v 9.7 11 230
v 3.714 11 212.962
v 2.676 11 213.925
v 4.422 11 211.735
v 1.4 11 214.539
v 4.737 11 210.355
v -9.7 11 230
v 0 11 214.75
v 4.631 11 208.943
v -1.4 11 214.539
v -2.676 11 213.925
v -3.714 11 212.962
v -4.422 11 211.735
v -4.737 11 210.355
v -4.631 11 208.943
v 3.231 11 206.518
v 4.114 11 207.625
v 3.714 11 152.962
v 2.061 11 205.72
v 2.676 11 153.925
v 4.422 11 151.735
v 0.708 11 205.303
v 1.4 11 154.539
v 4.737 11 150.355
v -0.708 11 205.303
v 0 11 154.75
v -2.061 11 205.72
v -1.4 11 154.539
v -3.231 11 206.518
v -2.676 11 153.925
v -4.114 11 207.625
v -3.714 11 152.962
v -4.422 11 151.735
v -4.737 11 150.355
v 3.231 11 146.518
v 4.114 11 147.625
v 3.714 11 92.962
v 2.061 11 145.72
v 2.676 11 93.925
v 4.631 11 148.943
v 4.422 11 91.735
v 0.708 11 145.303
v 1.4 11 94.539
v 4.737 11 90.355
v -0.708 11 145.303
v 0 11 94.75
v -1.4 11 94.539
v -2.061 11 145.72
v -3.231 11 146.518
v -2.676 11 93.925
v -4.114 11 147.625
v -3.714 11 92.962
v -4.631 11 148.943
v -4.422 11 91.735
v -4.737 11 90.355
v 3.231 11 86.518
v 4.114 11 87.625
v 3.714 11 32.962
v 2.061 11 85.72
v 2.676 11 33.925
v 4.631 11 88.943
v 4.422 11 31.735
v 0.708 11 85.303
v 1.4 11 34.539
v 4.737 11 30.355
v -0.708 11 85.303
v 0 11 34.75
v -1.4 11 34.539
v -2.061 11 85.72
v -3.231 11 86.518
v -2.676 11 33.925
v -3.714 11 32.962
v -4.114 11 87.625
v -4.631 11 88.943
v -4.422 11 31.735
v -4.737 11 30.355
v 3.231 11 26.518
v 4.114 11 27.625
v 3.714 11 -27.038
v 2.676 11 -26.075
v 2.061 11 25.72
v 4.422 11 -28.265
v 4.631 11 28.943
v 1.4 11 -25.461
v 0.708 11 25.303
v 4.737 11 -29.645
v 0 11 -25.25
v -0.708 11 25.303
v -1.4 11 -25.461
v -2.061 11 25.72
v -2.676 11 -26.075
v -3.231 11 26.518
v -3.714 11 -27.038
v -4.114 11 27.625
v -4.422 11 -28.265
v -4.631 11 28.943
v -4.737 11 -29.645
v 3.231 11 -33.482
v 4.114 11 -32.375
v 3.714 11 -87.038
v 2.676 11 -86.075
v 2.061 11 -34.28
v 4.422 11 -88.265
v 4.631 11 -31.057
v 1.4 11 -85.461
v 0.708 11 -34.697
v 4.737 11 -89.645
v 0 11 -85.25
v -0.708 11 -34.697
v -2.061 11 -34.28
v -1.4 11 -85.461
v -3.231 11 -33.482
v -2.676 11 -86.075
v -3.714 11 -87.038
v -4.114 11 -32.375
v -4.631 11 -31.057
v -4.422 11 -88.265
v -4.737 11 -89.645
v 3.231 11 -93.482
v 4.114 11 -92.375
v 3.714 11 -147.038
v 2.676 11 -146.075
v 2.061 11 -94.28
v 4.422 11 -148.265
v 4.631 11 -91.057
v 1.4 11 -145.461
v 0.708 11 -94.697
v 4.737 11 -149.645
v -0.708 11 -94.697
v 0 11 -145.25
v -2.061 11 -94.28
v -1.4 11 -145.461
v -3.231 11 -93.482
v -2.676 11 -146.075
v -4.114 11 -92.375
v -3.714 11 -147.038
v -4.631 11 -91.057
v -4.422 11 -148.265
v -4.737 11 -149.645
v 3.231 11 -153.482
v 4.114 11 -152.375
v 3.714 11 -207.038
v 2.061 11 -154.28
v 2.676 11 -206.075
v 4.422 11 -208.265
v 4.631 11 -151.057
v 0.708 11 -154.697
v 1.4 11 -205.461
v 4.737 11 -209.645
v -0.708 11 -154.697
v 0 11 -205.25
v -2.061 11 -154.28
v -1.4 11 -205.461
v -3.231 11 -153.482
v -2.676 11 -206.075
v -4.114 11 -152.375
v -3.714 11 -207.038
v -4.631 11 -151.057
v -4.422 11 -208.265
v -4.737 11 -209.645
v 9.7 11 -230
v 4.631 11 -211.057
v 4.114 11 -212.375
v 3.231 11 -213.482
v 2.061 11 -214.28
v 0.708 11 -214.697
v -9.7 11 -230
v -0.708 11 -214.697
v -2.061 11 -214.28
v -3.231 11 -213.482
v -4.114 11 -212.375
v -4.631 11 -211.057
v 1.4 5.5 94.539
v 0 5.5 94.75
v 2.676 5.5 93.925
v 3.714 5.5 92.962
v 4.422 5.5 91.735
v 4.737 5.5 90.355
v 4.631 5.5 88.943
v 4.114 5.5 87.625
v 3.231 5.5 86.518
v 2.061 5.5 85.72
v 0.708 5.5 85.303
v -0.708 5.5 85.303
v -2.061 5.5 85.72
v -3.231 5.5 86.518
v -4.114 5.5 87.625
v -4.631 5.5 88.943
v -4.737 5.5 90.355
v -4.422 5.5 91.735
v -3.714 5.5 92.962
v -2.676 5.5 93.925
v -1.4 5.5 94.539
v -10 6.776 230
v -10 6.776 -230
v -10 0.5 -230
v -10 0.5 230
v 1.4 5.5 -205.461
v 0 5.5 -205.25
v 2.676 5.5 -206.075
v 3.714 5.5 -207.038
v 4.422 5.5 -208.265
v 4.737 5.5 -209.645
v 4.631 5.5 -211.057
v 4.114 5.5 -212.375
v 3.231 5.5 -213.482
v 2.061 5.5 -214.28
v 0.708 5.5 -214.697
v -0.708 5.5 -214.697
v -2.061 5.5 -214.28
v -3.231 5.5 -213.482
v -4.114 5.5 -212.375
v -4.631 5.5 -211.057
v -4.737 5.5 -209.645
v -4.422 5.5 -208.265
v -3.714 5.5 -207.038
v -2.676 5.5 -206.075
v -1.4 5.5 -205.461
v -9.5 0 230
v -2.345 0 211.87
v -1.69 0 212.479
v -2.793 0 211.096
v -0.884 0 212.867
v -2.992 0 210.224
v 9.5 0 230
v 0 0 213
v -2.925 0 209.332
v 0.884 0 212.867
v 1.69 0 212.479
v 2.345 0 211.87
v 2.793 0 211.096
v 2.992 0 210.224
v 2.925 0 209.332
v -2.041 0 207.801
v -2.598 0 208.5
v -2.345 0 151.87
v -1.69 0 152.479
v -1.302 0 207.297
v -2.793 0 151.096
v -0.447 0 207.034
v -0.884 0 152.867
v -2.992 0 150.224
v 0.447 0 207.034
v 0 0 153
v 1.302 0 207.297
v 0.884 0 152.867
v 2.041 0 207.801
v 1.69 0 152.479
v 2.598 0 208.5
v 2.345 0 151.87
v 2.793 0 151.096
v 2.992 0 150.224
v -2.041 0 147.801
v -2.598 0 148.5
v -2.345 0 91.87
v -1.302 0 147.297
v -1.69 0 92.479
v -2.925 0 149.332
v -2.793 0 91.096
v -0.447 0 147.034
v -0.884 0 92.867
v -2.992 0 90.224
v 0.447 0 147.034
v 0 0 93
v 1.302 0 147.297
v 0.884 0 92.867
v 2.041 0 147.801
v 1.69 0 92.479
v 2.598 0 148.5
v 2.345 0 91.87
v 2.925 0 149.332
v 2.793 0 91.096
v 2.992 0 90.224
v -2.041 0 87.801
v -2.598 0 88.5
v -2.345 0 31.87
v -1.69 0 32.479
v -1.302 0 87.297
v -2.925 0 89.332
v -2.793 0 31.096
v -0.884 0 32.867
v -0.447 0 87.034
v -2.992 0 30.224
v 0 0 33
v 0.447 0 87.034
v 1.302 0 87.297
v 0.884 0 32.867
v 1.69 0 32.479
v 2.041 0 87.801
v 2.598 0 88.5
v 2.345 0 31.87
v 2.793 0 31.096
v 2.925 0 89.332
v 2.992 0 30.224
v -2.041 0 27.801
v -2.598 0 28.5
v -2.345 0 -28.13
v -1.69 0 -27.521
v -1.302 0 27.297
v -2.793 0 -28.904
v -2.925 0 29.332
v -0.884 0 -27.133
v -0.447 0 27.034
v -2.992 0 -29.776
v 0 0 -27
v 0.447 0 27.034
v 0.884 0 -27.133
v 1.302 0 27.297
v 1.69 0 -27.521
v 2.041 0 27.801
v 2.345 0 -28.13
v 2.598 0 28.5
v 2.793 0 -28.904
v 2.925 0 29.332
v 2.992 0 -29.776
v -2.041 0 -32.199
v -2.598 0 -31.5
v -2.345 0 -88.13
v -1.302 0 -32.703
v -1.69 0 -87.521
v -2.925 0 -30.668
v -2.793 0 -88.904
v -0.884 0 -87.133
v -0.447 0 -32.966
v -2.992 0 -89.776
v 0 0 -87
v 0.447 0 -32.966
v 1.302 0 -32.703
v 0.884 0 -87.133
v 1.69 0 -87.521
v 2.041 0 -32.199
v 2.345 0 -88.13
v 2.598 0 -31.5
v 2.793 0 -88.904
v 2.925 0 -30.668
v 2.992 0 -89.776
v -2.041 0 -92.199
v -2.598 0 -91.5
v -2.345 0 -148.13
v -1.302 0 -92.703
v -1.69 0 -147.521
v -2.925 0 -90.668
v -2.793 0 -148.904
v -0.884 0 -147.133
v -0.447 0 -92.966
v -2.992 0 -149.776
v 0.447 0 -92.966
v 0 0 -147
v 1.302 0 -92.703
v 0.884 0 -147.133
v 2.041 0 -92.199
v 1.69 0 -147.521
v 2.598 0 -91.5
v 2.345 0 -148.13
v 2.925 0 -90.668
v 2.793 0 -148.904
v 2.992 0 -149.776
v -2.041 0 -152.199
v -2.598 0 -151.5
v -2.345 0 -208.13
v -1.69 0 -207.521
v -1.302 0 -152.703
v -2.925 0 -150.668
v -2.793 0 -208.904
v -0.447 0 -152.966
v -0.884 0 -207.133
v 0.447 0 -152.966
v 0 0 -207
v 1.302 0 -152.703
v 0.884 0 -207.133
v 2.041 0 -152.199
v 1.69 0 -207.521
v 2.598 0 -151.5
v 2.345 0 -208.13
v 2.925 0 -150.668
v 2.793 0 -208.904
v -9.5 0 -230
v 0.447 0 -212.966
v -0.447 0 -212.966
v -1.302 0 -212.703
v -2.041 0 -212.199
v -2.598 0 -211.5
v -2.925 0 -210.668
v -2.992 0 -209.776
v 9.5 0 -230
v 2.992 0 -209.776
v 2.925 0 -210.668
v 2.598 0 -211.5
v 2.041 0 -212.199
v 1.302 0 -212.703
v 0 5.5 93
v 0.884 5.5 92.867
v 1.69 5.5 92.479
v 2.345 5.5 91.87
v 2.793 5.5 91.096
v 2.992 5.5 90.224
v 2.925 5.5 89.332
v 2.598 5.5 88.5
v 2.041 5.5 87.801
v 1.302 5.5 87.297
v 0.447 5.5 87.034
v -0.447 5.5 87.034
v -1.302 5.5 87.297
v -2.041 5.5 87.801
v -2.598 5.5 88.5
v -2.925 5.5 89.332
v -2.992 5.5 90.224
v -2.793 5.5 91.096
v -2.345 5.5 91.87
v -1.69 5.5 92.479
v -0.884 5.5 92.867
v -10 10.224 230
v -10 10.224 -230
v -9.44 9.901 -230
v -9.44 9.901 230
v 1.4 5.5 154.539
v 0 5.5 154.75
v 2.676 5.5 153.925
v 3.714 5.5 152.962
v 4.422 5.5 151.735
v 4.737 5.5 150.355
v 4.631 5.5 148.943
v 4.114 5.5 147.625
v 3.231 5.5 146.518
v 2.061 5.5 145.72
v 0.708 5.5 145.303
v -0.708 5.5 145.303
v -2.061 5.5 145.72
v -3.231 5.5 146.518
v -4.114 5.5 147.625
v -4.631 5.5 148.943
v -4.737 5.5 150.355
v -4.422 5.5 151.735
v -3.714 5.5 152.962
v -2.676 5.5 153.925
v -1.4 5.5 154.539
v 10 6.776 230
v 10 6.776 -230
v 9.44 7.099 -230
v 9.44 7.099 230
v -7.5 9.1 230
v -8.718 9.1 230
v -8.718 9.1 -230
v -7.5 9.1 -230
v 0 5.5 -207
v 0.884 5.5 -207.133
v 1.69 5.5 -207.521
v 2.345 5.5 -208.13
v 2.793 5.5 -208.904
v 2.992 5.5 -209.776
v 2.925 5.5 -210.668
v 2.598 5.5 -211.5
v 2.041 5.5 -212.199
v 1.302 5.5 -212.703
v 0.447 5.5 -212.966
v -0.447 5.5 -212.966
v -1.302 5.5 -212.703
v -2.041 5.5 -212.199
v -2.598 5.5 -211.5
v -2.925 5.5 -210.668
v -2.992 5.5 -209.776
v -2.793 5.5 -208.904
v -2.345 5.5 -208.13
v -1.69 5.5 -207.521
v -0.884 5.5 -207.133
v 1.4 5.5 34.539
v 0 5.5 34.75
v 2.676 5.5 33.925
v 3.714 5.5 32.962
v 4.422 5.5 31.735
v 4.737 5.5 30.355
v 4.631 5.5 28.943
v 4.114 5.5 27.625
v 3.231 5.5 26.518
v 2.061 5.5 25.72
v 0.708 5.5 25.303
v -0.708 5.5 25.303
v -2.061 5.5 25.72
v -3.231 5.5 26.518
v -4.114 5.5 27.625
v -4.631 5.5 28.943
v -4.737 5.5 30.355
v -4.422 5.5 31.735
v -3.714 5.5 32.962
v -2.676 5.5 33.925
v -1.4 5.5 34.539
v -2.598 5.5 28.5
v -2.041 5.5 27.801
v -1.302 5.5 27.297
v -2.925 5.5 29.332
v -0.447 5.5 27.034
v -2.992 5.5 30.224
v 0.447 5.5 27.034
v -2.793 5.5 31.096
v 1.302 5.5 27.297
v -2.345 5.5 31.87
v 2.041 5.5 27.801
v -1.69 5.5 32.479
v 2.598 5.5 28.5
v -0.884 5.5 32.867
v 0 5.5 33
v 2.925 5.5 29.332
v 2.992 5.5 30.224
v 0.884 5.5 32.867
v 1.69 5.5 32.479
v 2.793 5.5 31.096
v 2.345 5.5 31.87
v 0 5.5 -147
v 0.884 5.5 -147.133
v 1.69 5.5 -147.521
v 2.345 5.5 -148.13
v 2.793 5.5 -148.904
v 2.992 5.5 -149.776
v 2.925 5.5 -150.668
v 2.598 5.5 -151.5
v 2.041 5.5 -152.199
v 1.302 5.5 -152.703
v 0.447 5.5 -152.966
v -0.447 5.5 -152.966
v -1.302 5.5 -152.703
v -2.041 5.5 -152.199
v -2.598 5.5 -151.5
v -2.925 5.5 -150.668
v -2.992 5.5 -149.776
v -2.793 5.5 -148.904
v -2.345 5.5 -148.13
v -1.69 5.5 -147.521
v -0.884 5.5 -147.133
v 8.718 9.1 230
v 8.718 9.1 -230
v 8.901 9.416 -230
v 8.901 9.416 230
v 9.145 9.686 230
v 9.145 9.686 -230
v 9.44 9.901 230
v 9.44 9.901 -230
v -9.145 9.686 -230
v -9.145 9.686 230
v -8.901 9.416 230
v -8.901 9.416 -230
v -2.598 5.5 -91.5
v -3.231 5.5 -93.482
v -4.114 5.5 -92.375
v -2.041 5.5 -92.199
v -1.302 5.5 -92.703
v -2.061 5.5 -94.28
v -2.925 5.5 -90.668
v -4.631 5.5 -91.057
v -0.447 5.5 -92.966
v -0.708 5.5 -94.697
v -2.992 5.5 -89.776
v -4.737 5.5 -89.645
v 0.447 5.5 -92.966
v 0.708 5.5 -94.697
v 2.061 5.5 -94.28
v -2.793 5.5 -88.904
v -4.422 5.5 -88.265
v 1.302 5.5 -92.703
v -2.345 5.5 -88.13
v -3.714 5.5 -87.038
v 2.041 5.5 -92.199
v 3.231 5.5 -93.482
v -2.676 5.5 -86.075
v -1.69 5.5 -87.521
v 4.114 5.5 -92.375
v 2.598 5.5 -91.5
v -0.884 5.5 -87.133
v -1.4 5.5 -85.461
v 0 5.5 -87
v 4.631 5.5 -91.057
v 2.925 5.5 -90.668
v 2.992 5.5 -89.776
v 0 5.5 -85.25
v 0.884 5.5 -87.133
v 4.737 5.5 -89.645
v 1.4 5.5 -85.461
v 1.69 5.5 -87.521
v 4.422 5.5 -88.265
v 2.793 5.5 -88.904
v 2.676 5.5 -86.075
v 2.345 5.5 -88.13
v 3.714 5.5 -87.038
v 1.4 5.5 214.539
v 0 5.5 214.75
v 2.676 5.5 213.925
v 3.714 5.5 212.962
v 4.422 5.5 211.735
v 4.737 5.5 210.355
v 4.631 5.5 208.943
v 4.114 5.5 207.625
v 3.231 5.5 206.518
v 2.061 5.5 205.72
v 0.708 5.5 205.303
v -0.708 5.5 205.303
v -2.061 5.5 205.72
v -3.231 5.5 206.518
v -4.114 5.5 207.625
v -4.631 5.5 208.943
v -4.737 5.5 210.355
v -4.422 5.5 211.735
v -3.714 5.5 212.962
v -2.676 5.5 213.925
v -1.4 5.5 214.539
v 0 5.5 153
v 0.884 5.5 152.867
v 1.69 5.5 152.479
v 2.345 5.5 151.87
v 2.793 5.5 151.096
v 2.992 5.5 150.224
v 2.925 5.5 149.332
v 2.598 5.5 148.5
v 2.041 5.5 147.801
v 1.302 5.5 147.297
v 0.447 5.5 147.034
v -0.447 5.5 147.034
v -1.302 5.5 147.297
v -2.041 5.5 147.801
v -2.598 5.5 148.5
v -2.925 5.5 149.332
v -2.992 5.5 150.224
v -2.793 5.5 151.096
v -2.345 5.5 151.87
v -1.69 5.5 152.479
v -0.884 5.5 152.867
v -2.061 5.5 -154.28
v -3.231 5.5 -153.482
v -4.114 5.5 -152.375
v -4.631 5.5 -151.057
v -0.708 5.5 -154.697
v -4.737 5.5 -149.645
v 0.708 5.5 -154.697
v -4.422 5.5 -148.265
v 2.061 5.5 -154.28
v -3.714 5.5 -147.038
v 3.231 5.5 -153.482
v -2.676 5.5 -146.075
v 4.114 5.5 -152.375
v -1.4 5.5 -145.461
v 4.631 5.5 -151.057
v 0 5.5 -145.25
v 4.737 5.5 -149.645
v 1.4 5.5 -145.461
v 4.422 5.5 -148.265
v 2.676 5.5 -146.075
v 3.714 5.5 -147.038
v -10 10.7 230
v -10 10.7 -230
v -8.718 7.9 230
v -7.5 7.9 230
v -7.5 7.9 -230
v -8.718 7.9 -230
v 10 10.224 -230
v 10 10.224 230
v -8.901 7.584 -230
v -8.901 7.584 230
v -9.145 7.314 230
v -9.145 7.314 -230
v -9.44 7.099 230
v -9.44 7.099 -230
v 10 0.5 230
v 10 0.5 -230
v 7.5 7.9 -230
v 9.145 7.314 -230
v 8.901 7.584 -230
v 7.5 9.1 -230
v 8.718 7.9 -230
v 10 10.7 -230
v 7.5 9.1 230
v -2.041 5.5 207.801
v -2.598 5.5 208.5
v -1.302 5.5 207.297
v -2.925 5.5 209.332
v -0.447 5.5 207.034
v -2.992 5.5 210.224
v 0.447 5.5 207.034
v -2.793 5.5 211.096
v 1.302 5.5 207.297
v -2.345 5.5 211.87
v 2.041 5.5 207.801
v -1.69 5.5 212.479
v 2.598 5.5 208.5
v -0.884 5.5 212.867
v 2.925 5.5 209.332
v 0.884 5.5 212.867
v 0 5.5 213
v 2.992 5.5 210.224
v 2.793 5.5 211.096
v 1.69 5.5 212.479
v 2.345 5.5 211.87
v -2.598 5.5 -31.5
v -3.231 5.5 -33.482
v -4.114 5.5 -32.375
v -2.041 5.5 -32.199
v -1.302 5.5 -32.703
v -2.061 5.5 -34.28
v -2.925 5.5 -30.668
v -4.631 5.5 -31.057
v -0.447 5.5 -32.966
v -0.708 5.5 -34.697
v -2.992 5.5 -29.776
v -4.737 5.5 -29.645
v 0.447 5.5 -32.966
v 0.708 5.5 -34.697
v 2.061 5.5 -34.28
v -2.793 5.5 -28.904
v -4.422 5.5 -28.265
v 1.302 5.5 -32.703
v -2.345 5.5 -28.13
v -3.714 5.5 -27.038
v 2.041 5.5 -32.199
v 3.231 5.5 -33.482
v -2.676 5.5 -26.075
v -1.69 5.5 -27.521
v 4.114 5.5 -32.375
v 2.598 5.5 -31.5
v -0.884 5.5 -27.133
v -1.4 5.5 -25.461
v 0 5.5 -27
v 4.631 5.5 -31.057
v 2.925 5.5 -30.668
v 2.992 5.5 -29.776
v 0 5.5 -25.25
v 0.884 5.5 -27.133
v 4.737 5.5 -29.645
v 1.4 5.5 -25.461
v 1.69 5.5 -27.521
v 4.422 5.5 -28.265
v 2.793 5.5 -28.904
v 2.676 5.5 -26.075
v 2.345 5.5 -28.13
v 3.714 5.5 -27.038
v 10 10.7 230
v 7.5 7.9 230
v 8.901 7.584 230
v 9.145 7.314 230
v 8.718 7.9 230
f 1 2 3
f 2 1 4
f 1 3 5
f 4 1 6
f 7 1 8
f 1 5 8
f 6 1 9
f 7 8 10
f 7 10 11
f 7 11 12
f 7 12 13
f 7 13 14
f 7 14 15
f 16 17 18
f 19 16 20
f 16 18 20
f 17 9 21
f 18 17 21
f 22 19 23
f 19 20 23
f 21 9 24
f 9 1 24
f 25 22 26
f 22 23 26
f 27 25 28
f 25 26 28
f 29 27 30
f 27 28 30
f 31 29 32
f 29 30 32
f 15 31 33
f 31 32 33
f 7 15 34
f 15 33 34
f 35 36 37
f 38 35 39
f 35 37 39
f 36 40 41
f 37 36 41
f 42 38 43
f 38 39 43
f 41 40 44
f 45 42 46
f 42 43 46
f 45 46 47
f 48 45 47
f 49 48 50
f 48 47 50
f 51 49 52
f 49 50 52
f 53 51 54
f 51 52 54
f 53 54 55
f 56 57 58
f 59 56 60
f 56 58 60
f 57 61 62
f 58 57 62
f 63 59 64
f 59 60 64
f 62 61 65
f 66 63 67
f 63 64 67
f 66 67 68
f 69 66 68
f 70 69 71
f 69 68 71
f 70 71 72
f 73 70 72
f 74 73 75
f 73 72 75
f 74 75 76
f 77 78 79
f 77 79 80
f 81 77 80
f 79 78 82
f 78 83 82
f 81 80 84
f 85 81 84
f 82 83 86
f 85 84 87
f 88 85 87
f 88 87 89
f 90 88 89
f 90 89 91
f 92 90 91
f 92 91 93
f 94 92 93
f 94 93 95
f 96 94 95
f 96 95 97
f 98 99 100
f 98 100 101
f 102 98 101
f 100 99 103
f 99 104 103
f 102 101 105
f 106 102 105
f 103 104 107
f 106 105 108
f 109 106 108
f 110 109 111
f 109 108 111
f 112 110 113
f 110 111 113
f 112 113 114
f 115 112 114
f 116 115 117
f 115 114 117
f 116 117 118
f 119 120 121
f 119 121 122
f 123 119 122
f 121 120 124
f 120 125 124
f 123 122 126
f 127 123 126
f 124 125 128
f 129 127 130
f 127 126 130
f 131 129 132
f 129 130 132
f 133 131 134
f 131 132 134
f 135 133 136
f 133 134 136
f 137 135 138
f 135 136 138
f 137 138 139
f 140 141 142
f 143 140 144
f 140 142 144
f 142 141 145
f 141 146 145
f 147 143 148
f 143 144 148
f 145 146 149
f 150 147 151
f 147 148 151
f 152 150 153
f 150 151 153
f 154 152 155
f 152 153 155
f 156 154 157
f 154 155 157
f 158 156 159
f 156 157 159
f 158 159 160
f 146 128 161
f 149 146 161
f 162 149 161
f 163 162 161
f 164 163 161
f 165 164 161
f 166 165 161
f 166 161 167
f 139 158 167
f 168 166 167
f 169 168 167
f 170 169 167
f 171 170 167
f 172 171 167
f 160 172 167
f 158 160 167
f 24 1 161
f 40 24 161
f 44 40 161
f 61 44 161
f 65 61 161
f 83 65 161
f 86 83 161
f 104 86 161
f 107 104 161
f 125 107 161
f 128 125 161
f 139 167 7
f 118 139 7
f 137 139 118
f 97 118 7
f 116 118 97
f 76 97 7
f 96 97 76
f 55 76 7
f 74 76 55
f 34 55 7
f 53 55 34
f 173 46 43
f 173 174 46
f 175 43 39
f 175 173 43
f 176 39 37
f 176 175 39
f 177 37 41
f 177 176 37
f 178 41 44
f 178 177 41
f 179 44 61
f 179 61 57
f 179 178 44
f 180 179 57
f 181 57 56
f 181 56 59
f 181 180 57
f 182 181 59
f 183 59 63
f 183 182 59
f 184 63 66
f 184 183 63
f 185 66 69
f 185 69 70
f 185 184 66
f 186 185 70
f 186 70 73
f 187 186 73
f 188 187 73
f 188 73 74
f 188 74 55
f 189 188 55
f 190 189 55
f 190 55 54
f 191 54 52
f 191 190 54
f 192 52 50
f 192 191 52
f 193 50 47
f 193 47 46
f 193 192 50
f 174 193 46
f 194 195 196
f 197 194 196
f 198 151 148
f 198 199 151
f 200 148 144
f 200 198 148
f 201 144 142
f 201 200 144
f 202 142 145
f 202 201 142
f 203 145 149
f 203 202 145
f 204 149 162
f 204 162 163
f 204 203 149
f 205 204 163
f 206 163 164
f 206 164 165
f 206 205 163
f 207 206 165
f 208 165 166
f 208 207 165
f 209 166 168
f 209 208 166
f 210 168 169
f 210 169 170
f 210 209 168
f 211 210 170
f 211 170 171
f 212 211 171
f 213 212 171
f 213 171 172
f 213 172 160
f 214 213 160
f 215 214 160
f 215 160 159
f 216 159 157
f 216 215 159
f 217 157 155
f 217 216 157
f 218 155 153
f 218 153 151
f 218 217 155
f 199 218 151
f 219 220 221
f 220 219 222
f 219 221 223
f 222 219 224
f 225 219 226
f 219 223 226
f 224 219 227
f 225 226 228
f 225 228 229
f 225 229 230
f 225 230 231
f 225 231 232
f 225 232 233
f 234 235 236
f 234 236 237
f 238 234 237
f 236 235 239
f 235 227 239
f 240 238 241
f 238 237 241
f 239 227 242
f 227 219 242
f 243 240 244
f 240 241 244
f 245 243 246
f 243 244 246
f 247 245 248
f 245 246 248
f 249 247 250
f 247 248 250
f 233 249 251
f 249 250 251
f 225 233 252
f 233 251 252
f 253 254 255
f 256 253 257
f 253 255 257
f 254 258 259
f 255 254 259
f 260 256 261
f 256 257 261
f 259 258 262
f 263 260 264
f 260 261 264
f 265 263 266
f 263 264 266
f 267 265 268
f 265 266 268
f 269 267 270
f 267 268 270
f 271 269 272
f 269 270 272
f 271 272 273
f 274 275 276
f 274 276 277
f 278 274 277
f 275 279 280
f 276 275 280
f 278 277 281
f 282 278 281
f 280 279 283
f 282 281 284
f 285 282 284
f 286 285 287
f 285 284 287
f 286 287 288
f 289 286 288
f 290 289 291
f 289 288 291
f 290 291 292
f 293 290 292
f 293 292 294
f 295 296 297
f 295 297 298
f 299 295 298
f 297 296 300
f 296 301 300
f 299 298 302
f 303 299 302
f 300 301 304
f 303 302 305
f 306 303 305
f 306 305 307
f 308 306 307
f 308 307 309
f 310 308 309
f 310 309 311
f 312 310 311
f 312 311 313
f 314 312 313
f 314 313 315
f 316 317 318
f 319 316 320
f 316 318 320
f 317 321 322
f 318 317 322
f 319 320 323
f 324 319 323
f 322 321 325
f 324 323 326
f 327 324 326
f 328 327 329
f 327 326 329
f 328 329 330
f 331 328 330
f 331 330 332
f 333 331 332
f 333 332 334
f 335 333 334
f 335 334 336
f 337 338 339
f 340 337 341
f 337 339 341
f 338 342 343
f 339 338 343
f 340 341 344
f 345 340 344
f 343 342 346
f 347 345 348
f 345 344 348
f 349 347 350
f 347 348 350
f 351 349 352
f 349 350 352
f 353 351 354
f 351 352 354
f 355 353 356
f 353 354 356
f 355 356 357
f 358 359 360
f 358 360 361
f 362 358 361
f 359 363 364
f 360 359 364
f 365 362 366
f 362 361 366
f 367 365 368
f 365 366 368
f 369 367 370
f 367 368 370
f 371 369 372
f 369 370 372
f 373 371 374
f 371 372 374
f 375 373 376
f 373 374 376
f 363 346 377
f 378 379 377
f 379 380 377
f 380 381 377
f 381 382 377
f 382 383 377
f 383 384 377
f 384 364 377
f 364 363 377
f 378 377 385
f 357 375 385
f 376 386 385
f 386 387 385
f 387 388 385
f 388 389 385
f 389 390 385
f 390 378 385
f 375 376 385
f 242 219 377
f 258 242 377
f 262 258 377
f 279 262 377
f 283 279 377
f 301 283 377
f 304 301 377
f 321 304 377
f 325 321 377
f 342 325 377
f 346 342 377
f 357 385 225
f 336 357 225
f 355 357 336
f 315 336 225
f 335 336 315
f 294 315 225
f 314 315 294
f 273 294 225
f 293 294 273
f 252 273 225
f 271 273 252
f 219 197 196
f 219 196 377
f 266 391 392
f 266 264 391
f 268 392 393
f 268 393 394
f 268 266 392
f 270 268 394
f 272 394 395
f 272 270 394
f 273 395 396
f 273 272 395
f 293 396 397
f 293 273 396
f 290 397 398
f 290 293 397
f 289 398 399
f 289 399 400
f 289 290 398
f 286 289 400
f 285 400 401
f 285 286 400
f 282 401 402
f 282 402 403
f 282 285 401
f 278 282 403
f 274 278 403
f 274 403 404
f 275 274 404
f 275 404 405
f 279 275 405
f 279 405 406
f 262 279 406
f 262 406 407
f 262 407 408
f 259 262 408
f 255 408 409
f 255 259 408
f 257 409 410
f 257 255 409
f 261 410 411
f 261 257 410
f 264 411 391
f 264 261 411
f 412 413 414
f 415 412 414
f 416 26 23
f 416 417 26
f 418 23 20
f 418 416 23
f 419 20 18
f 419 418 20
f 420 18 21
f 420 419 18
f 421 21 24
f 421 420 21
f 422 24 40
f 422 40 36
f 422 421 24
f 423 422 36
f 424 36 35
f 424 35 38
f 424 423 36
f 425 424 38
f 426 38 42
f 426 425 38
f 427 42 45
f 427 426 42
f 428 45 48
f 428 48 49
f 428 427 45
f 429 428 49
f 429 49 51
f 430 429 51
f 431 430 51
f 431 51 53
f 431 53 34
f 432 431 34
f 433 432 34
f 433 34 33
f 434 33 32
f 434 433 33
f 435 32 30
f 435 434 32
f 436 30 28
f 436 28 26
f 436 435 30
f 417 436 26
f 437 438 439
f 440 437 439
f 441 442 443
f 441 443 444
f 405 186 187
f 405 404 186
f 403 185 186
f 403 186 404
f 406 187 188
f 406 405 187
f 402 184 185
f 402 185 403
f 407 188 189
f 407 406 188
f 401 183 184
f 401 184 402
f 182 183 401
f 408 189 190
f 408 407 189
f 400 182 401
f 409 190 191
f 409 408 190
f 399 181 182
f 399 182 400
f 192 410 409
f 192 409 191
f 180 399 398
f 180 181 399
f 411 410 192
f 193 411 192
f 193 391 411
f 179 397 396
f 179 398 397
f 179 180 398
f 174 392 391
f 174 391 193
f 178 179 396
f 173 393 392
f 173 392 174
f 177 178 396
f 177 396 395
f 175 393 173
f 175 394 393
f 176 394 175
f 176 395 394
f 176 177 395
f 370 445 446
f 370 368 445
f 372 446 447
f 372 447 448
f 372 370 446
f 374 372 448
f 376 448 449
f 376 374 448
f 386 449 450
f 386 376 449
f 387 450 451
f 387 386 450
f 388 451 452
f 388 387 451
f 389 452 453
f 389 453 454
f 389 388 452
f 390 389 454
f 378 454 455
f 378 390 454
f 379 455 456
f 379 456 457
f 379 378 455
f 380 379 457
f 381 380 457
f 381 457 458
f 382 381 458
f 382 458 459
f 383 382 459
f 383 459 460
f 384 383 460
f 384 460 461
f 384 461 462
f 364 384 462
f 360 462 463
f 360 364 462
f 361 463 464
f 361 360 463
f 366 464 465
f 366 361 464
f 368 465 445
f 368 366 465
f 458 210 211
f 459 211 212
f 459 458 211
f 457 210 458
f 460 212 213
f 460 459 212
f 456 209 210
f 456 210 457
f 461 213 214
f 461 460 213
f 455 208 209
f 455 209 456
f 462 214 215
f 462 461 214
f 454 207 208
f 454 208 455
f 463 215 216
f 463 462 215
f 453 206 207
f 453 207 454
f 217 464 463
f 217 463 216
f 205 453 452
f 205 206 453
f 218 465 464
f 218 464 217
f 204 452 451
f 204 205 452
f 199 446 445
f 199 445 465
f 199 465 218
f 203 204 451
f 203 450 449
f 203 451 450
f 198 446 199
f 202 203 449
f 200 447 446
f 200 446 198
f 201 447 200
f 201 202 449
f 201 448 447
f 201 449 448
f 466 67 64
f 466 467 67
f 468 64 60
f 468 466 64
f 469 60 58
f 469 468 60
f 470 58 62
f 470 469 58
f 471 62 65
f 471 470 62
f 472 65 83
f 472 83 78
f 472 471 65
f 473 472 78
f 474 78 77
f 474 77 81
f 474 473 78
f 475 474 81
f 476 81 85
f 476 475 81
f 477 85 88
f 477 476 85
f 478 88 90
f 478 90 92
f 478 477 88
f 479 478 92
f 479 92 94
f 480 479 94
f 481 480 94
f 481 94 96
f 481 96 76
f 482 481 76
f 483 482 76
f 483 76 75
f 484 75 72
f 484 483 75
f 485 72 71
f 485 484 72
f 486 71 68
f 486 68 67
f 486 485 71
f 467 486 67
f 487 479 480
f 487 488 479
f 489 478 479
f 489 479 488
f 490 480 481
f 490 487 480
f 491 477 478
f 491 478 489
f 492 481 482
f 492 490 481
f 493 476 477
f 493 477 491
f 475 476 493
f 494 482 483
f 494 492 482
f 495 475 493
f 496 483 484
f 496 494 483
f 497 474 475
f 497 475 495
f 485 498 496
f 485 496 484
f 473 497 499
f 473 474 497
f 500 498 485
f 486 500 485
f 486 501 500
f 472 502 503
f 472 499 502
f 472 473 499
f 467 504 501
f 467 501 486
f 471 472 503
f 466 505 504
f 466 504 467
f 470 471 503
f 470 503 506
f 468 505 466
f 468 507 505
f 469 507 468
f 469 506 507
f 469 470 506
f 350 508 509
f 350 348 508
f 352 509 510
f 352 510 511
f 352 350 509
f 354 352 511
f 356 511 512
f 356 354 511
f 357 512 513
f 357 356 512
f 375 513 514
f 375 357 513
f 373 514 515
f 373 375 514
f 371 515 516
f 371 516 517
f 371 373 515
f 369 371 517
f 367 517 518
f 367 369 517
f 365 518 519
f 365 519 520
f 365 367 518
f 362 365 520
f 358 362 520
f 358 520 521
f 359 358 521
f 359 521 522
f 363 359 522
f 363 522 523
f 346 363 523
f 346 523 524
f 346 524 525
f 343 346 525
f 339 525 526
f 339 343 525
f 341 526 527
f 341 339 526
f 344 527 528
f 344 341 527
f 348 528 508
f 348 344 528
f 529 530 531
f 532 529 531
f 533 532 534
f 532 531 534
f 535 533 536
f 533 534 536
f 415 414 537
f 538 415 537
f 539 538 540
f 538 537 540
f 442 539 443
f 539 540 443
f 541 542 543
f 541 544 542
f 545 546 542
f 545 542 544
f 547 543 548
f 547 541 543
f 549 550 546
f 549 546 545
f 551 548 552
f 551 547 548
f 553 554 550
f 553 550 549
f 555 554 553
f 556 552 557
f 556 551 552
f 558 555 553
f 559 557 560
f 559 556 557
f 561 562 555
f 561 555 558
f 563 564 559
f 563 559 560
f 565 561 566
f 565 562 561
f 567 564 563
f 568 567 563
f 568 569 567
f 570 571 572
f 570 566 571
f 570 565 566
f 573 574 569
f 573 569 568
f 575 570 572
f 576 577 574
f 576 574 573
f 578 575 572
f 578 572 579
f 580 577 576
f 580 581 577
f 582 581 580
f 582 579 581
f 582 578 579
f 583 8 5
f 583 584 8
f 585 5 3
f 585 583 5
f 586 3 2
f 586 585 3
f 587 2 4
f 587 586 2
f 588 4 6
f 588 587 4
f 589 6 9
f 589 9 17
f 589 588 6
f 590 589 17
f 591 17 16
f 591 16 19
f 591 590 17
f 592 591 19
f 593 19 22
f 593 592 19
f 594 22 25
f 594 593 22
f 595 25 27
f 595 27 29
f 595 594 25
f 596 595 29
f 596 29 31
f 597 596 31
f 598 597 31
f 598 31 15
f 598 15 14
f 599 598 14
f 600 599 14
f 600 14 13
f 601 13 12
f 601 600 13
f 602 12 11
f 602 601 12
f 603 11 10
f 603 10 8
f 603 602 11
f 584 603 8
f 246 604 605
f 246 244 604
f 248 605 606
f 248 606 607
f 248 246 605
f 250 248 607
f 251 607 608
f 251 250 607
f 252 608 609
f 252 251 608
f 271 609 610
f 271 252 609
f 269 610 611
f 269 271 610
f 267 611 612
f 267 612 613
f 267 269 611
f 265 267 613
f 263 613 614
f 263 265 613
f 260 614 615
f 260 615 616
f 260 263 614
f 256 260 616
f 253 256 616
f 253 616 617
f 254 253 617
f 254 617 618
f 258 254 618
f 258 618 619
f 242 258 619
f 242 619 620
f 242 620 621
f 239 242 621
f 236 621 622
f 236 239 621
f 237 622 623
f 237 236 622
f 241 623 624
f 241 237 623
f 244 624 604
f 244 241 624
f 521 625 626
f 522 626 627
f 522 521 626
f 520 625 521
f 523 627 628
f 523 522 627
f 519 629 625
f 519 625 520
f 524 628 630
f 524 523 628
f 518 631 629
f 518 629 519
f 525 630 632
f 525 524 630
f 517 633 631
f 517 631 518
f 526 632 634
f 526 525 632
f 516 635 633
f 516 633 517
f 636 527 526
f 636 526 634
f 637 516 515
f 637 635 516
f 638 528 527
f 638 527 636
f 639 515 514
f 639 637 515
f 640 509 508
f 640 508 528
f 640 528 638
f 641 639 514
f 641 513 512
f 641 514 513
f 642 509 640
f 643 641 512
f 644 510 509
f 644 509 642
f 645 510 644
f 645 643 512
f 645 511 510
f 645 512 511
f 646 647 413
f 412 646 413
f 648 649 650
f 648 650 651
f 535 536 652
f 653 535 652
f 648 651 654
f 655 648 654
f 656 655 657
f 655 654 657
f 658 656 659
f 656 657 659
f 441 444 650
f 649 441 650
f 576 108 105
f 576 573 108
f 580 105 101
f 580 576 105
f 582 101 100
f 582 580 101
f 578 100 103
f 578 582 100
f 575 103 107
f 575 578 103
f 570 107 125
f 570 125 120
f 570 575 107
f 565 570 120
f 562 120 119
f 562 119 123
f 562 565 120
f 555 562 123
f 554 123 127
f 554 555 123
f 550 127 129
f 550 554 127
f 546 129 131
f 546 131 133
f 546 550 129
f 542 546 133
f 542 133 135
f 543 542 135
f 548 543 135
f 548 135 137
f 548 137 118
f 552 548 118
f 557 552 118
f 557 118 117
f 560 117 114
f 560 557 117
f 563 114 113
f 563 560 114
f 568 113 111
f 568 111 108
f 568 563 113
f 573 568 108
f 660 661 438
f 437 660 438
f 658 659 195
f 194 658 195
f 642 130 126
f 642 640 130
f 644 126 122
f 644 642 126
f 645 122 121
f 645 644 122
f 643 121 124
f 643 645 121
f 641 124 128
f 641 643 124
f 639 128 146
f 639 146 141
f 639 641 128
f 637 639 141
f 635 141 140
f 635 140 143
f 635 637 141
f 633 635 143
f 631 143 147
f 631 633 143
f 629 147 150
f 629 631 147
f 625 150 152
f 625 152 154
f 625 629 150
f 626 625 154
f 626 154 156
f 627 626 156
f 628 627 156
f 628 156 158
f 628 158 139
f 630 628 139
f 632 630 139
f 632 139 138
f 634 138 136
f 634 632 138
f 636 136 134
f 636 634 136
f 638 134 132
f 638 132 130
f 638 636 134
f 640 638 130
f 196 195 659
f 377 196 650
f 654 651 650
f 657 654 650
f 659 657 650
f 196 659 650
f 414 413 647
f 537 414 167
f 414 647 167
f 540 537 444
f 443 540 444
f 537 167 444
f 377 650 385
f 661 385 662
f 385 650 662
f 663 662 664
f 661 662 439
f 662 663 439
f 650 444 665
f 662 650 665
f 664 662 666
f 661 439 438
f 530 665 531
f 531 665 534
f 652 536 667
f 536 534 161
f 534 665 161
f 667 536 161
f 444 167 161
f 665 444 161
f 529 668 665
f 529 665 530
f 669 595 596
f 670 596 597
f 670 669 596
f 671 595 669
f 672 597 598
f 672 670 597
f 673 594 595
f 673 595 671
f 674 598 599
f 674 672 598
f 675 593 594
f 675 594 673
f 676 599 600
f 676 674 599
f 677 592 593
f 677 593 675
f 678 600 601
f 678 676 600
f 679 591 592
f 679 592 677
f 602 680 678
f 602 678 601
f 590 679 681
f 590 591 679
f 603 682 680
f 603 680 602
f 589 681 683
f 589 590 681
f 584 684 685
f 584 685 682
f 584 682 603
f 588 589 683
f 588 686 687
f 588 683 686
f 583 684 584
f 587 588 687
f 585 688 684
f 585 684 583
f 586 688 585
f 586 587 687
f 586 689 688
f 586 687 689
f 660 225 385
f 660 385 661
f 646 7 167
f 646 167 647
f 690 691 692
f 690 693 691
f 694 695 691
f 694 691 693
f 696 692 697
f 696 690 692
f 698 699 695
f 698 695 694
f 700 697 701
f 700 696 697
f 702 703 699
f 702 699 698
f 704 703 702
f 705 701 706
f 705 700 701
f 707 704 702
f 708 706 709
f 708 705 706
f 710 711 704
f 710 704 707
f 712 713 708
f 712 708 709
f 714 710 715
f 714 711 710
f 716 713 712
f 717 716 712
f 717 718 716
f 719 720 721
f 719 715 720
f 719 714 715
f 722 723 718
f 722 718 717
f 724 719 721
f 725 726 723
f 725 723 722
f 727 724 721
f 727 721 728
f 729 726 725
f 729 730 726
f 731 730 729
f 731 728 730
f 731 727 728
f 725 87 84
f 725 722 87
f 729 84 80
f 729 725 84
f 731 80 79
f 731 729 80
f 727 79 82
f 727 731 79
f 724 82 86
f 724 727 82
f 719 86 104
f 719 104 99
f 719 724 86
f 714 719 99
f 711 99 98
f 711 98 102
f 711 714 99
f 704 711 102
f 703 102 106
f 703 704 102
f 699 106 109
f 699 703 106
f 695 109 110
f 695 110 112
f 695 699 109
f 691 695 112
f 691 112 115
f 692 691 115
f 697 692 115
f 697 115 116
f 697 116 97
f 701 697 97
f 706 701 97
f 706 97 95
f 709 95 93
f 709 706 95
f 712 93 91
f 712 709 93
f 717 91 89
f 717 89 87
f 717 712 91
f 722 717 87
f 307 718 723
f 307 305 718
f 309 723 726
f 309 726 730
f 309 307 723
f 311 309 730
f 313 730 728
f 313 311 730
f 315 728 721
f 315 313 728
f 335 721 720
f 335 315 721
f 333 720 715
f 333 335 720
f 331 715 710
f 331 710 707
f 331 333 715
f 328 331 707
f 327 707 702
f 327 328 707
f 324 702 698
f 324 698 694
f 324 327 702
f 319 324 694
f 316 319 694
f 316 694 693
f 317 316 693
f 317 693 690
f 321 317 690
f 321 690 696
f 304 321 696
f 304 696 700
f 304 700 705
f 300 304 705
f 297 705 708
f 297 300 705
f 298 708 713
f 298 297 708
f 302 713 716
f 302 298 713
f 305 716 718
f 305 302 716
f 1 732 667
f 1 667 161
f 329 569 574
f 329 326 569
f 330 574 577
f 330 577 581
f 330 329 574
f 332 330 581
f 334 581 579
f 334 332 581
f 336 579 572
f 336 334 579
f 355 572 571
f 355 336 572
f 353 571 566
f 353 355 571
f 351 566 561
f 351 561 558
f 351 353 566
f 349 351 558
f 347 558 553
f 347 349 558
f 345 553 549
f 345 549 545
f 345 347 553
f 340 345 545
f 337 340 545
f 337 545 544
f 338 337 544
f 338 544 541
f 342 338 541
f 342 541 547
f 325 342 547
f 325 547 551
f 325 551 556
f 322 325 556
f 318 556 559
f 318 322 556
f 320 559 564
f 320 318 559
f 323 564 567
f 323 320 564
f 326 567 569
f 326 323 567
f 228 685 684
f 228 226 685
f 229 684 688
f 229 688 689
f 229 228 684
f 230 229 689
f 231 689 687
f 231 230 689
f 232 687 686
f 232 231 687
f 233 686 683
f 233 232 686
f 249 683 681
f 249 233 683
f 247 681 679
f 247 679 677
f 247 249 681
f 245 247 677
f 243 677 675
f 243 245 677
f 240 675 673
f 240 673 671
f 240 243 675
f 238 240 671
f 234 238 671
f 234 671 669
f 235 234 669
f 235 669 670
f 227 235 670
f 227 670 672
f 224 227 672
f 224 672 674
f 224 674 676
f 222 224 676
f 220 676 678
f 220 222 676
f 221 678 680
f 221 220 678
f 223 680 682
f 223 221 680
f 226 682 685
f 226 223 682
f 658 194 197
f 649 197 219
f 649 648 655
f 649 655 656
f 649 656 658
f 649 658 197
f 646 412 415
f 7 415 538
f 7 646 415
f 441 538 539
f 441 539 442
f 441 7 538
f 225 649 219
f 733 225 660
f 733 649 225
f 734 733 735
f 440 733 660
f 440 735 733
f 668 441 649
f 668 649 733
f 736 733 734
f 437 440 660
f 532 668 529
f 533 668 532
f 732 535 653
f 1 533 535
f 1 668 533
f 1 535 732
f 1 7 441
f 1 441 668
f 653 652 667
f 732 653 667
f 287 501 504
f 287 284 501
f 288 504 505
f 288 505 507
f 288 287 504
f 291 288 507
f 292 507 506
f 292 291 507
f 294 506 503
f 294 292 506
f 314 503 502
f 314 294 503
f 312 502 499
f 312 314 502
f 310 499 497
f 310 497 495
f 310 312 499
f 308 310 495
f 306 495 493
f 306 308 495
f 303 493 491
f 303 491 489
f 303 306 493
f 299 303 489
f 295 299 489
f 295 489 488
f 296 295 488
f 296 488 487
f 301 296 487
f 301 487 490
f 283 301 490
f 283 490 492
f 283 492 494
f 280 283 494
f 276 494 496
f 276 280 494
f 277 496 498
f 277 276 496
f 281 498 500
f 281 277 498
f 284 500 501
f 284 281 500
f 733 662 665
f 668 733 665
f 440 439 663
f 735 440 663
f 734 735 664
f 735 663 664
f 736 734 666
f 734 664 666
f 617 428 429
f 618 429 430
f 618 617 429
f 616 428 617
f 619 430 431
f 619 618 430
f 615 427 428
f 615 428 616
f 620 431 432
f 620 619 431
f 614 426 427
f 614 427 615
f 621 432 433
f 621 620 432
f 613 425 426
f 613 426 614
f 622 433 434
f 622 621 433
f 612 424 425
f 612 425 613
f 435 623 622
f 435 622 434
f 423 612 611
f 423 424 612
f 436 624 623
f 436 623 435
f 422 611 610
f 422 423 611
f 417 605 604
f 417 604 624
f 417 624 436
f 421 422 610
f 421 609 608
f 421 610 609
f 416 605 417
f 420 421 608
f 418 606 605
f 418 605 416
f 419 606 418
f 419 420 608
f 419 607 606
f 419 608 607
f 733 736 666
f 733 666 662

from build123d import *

# Parameters (mm, degrees)
BOSS_EXTRUDE1_DEPTH      = 230
BOSS_EXTRUDE1_DEPTH_BACK = 230


with BuildPart() as part:
    # Sketch1 → Boss-Extrude1 (new, two sides: drawn at the far end of the back side and taken through both)
    with BuildSketch(Plane.XY.offset(-BOSS_EXTRUDE1_DEPTH_BACK)):
        with BuildLine():
            Line((-10, 6.77615), (-10, 0.5))
            Line((-10, 0.5), (-9.5, 0))
            Line((-9.5, 0), (9.5, 0))
            Line((9.5, 0), (10, 0.5))
            Line((10, 0.5), (10, 6.77615))
            Line((10, 6.77615), (9.440021531, 7.099443113))
            ThreePointArc((9.440021531, 7.099443113), (9.015681976, 7.442706235), (8.71772889, 7.9))
            Line((8.71772889, 7.9), (7.5, 7.9))
            Line((7.5, 7.9), (7.5, 9.1))
            Line((7.5, 9.1), (8.71772889, 9.1))
            ThreePointArc((8.71772889, 9.1), (9.015681976, 9.557293765), (9.440021531, 9.900556887))
            Line((9.440021531, 9.900556887), (10, 10.22385))
            Line((10, 10.22385), (10, 10.7))
            Line((10, 10.7), (9.7, 11))
            Line((9.7, 11), (-9.7, 11))
            Line((-9.7, 11), (-10, 10.7))
            Line((-10, 10.7), (-10, 10.22385))
            Line((-10, 10.22385), (-9.440021531, 9.900556887))
            ThreePointArc((-9.440021531, 9.900556887), (-9.015681976, 9.557293765), (-8.71772889, 9.1))
            Line((-8.71772889, 9.1), (-7.5, 9.1))
            Line((-7.5, 9.1), (-7.5, 7.9))
            Line((-7.5, 7.9), (-8.71772889, 7.9))
            ThreePointArc((-8.71772889, 7.9), (-9.015681976, 7.442706235), (-9.440021531, 7.099443113))
            Line((-9.440021531, 7.099443113), (-10, 6.77615))
        make_face()
    extrude(amount=BOSS_EXTRUDE1_DEPTH + BOSS_EXTRUDE1_DEPTH_BACK)

    # Sketch2 → Cut-Revolve1 (revolve, cut)
    with BuildSketch(Plane(origin=(0, 0, 0), x_dir=(0, 0, -1), z_dir=(1, 0, 0))):
        Polygon((210, 11), (214.75, 11), (214.75, 5.5), (213, 5.5), (213, 0), (210, 0), align=None)
    revolve(axis=Axis((0, 0, -210), (0, 1, 0)), mode=Mode.SUBTRACT)

    # Sketch3 → Cut-Revolve2 (revolve, cut)
    with BuildSketch(Plane(origin=(0, 0, 0), x_dir=(0, 0, -1), z_dir=(1, 0, 0))):
        Polygon((150, 11), (154.75, 11), (154.75, 5.5), (153, 5.5), (153, 0), (150, 0), align=None)
    revolve(axis=Axis((0, 0, -150), (0, 1, 0)), mode=Mode.SUBTRACT)

    # Sketch4 → Cut-Revolve3 (revolve, cut)
    with BuildSketch(Plane(origin=(0, 0, 0), x_dir=(0, 0, -1), z_dir=(1, 0, 0))):
        Polygon((90, 11), (94.75, 11), (94.75, 5.5), (93, 5.5), (93, 0), (90, 0), align=None)
    revolve(axis=Axis((0, 0, -90), (0, 1, 0)), mode=Mode.SUBTRACT)

    # Sketch5 → Cut-Revolve4 (revolve, cut)
    with BuildSketch(Plane(origin=(0, 0, 0), x_dir=(0, 0, -1), z_dir=(1, 0, 0))):
        Polygon((30, 11), (34.75, 11), (34.75, 5.5), (33, 5.5), (33, 0), (30, 0), align=None)
    revolve(axis=Axis((0, 0, -30), (0, 1, 0)), mode=Mode.SUBTRACT)

    # Sketch6 → Cut-Revolve5 (revolve, cut)
    with BuildSketch(Plane(origin=(0, 0, 0), x_dir=(0, 0, -1), z_dir=(1, 0, 0))):
        Polygon((-30, 11), (-25.25, 11), (-25.25, 5.5), (-27, 5.5), (-27, 0), (-30, 0), align=None)
    revolve(axis=Axis((0, 0, 30), (0, 1, 0)), mode=Mode.SUBTRACT)

    # Sketch7 → Cut-Revolve6 (revolve, cut)
    with BuildSketch(Plane(origin=(0, 0, 0), x_dir=(0, 0, -1), z_dir=(1, 0, 0))):
        Polygon((-90, 11), (-85.25, 11), (-85.25, 5.5), (-87, 5.5), (-87, 0), (-90, 0), align=None)
    revolve(axis=Axis((0, 0, 90), (0, 1, 0)), mode=Mode.SUBTRACT)

    # Sketch8 → Cut-Revolve7 (revolve, cut)
    with BuildSketch(Plane(origin=(0, 0, 0), x_dir=(0, 0, -1), z_dir=(1, 0, 0))):
        Polygon((-150, 11), (-145.25, 11), (-145.25, 5.5), (-147, 5.5), (-147, 0), (-150, 0), align=None)
    revolve(axis=Axis((0, 0, 150), (0, 1, 0)), mode=Mode.SUBTRACT)

    # Sketch9 → Cut-Revolve8 (revolve, cut)
    with BuildSketch(Plane(origin=(0, 0, 0), x_dir=(0, 0, -1), z_dir=(1, 0, 0))):
        Polygon((-210, 11), (-205.25, 11), (-205.25, 5.5), (-207, 5.5), (-207, 0), (-210, 0), align=None)
    revolve(axis=Axis((0, 0, 210), (0, 1, 0)), mode=Mode.SUBTRACT)


solid = part.part
